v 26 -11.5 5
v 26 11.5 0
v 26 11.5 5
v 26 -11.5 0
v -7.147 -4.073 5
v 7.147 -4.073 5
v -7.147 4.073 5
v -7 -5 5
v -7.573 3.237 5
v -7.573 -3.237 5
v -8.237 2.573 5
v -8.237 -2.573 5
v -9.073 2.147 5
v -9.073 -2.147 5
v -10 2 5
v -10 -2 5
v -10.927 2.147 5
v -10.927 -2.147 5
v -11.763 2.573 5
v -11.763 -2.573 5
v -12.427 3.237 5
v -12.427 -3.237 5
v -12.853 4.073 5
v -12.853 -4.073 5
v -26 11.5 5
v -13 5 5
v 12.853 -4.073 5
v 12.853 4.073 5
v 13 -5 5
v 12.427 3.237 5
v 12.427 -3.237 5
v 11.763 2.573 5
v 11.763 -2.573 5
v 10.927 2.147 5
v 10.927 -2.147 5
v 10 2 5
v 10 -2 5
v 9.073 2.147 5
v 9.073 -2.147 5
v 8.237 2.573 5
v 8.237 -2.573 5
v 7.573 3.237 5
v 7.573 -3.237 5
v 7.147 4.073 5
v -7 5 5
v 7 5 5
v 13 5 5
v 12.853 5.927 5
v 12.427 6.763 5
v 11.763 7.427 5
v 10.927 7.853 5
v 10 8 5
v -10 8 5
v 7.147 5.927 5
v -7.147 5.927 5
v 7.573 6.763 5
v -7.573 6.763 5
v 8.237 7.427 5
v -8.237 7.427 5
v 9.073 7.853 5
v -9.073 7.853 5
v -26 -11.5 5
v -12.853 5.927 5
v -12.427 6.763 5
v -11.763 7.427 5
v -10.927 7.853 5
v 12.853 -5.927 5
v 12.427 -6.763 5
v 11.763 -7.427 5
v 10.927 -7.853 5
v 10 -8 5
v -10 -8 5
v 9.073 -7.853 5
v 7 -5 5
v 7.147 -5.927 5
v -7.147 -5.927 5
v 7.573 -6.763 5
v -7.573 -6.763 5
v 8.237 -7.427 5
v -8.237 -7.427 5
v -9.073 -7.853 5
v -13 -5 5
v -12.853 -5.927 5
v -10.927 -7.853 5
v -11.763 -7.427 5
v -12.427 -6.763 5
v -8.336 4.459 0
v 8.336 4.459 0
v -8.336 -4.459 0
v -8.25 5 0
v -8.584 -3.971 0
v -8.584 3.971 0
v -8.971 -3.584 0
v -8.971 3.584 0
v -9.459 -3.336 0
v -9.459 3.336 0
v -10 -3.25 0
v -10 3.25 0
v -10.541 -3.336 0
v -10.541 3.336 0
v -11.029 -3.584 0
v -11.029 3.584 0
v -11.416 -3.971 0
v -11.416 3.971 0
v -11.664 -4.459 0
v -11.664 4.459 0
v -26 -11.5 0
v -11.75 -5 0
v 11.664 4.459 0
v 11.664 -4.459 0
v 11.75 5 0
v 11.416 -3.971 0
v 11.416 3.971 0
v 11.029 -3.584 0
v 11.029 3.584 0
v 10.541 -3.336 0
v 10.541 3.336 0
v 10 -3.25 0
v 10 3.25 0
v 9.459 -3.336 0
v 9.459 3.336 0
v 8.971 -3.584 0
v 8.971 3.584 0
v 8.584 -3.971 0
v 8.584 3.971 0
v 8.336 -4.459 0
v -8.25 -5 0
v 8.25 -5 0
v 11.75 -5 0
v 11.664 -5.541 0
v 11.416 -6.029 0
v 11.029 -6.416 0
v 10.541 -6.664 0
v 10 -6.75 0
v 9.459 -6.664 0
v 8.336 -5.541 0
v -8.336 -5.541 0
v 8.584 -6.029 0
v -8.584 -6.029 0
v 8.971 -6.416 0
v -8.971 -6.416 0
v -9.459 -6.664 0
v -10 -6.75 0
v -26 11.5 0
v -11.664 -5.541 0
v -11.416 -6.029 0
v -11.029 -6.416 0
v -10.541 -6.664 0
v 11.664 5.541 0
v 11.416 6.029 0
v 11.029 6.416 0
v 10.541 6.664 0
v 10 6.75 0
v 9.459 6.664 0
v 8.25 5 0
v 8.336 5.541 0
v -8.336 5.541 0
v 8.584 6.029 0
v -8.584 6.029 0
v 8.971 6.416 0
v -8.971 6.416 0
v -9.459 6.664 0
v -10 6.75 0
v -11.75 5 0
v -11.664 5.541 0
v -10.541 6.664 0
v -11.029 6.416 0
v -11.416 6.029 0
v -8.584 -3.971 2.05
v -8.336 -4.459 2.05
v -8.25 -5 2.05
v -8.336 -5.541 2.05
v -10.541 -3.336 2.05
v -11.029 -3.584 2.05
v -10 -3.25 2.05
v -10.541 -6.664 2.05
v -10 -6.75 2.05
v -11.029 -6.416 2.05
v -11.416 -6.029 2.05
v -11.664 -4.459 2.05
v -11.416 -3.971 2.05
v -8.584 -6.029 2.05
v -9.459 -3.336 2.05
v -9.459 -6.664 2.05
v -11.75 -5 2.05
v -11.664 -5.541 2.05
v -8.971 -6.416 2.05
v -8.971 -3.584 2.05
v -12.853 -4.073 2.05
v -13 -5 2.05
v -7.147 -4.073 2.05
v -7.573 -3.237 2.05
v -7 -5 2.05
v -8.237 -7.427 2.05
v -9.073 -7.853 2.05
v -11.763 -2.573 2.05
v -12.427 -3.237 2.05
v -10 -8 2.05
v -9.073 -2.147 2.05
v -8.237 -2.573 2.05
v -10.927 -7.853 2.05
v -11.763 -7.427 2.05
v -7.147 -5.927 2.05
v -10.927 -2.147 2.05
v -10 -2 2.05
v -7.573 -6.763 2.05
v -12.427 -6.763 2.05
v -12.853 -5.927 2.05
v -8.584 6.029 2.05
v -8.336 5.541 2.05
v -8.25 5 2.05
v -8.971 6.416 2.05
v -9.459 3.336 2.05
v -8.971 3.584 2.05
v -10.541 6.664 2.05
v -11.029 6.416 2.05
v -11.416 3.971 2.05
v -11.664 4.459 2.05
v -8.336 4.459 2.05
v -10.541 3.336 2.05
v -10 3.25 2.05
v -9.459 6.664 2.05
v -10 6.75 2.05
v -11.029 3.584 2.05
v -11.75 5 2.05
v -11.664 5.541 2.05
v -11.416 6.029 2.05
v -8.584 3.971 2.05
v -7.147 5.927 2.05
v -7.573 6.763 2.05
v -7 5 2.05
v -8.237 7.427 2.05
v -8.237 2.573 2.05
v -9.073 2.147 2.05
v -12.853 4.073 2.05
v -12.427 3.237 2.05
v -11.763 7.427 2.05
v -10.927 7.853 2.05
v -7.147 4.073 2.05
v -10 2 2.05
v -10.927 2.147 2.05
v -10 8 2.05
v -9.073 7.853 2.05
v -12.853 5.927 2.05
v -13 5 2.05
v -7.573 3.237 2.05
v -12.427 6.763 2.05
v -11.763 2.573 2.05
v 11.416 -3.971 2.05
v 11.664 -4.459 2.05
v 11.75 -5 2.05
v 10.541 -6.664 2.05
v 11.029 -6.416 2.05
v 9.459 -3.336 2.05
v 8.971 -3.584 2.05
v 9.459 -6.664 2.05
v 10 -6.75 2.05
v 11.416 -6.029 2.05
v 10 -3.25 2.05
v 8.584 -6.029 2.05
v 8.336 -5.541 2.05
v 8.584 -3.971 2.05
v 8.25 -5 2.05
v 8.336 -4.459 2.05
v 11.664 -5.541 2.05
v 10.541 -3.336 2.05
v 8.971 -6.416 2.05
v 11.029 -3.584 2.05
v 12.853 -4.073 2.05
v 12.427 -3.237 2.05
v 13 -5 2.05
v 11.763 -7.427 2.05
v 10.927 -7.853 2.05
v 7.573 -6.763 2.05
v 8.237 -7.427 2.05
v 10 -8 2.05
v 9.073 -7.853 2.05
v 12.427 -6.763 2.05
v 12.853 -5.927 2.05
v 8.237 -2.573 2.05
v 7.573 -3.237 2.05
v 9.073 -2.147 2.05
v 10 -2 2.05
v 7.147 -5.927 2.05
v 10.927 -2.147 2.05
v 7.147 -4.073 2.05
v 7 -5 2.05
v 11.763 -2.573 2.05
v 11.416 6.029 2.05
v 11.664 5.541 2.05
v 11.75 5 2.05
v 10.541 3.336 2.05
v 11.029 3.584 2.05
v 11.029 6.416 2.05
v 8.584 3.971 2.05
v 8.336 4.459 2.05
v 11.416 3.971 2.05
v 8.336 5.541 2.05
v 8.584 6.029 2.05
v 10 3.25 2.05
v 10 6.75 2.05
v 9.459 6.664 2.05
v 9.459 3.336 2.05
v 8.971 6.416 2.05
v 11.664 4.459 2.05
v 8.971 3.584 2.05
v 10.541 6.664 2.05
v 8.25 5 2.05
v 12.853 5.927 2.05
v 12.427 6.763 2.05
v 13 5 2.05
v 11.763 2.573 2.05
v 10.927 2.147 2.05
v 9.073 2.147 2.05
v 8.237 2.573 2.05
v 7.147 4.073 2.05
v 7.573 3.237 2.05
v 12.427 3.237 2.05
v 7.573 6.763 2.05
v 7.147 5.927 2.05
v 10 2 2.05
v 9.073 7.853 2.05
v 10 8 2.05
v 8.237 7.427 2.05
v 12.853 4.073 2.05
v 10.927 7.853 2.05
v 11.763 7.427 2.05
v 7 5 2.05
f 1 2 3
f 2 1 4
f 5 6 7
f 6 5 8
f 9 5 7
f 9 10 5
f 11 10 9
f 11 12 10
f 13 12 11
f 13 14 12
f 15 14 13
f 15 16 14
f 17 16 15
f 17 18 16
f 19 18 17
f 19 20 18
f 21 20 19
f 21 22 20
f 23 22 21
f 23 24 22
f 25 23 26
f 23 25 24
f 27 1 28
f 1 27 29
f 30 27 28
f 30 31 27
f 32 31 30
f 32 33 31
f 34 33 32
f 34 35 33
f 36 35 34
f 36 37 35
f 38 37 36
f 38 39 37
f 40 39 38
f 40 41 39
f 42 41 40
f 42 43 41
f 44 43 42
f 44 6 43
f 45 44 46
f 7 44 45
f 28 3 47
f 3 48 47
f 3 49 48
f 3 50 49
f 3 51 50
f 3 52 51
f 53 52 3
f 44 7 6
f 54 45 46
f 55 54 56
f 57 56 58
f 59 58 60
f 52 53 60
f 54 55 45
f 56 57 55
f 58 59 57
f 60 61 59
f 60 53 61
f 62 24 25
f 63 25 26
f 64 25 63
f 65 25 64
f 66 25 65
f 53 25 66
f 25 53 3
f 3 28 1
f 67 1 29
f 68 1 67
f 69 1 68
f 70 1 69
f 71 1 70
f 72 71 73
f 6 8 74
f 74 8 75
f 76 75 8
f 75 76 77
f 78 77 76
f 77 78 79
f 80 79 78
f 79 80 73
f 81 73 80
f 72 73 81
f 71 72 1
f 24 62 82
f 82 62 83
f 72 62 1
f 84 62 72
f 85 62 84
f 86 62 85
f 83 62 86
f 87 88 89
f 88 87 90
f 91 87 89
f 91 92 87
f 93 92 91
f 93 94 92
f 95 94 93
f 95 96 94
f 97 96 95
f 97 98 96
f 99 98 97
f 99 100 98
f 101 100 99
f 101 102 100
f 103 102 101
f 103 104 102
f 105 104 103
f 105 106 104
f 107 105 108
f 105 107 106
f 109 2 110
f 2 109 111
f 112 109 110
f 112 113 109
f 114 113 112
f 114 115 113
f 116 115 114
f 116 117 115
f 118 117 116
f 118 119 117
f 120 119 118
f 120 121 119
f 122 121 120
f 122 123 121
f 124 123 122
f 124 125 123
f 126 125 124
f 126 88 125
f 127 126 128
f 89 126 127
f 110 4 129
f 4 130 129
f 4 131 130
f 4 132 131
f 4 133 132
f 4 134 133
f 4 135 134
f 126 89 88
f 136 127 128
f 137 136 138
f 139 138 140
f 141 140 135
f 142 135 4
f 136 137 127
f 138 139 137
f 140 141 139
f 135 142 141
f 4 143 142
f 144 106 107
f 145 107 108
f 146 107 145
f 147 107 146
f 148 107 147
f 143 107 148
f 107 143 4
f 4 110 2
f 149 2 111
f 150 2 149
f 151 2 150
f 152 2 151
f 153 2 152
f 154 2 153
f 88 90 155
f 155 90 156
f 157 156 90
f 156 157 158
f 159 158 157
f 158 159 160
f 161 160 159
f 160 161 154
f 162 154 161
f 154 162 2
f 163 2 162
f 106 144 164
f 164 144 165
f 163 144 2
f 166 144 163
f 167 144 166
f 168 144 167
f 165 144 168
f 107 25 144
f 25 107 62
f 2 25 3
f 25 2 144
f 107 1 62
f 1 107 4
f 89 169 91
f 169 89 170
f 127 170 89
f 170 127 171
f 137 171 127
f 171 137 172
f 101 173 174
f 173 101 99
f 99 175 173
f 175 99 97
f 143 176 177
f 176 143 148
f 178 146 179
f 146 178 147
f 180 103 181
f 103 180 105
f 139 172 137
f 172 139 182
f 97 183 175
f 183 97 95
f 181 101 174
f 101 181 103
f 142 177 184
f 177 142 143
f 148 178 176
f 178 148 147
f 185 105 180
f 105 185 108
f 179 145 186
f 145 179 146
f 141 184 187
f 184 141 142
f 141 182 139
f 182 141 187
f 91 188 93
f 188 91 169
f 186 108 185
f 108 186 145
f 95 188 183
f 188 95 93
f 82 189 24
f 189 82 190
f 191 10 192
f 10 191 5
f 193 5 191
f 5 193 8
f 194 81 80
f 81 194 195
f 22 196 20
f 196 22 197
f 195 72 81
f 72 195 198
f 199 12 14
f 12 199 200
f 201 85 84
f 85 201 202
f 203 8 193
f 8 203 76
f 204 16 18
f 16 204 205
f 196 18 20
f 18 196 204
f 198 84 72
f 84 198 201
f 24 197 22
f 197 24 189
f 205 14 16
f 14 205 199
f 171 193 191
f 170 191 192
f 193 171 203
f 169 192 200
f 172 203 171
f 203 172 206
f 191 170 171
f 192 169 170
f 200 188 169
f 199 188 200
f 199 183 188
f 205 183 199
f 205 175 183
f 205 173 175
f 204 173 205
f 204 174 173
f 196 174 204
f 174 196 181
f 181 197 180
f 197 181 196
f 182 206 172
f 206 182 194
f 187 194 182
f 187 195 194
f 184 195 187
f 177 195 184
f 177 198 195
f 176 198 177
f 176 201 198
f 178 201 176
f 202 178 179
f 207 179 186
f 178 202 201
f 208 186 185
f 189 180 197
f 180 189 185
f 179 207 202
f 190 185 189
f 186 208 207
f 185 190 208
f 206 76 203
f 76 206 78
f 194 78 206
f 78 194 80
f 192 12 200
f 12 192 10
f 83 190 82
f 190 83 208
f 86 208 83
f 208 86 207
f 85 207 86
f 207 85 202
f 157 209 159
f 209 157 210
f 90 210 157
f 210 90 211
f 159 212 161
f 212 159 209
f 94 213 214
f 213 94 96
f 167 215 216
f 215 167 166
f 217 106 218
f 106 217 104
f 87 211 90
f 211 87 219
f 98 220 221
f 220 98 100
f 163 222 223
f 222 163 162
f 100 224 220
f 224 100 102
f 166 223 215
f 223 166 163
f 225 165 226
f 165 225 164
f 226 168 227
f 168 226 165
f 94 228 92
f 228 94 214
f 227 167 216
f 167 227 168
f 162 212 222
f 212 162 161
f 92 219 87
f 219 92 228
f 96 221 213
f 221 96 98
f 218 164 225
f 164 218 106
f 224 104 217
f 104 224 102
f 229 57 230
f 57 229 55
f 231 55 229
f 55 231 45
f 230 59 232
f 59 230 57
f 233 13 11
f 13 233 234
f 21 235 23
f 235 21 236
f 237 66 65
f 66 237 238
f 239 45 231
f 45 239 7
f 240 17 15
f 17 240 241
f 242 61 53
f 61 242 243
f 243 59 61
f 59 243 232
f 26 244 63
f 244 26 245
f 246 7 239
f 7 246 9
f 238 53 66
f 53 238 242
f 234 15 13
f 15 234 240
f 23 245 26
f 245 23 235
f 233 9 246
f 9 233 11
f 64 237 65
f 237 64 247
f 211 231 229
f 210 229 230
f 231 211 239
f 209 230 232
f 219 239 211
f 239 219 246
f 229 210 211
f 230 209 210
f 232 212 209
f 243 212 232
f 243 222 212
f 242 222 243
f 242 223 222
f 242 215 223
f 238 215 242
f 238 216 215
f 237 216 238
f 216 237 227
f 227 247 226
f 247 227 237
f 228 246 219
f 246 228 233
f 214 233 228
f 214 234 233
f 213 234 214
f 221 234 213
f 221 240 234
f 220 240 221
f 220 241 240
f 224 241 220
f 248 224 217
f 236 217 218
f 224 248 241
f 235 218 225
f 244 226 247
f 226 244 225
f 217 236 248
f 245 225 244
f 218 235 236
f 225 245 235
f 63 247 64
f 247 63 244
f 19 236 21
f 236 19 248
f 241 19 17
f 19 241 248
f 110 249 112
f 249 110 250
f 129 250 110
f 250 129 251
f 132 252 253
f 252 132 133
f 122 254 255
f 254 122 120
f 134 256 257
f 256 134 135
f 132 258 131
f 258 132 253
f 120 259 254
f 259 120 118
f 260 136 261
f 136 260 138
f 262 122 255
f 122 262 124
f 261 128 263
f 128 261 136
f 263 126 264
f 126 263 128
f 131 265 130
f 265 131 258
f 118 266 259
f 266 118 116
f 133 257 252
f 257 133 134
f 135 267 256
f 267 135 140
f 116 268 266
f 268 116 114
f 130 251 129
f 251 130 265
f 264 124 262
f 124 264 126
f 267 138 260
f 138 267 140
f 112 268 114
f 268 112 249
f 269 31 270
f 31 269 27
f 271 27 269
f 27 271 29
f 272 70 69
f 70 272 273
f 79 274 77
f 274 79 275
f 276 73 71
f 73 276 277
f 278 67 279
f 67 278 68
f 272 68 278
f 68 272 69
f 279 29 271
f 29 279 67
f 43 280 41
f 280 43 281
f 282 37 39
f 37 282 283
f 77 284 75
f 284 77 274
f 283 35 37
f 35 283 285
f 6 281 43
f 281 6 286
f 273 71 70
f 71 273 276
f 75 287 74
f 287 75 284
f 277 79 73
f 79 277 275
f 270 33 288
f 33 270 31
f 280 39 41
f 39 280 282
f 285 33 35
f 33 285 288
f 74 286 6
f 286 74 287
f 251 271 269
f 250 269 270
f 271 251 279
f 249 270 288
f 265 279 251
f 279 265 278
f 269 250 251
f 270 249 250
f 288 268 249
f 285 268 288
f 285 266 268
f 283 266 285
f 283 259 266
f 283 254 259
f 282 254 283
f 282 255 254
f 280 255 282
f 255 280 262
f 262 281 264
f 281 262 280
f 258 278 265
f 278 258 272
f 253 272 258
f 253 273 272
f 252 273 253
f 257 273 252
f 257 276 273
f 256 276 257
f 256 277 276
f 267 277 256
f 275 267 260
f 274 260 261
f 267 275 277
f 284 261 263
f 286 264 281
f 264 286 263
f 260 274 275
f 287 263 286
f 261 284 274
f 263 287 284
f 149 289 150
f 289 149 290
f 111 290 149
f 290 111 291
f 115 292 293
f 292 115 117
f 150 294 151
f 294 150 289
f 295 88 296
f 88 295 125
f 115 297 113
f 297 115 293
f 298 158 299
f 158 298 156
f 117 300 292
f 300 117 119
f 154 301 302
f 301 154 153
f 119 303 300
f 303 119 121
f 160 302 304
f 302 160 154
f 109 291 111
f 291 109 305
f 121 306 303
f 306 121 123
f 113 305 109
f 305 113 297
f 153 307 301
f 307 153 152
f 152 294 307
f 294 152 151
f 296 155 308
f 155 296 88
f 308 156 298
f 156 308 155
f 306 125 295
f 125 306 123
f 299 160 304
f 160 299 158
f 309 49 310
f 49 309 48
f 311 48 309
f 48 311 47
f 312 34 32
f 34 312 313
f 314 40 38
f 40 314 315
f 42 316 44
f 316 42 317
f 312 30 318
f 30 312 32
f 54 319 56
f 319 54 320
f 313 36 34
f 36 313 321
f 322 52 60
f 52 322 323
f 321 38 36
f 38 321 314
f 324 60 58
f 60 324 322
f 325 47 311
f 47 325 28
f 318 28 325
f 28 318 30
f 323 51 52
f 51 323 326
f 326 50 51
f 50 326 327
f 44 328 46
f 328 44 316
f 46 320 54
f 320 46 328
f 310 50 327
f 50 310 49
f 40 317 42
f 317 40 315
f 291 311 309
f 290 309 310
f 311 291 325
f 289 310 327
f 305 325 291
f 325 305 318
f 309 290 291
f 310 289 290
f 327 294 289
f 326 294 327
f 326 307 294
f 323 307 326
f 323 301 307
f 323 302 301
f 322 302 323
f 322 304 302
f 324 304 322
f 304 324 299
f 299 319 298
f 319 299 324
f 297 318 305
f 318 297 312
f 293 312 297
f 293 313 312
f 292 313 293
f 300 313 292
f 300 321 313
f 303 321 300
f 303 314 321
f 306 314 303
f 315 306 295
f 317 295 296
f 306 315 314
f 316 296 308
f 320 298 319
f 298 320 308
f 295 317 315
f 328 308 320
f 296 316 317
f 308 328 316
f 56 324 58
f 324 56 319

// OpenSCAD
difference() {
	translate(v = [0, 0, 2.5000000000]) {
		cube(center = true, size = [52.0000000000, 23.0000000000, 5]);
	}
	translate(v = [-10, -5, 0]) {
		cylinder($fn = 20, d = 3.5000000000, h = 10);
	}
	translate(v = [-10, -5, 2.0500000000]) {
		cylinder($fn = 20, d = 6.0000000000, h = 3);
	}
	translate(v = [-10, 5, 0]) {
		cylinder($fn = 20, d = 3.5000000000, h = 10);
	}
	translate(v = [-10, 5, 2.0500000000]) {
		cylinder($fn = 20, d = 6.0000000000, h = 3);
	}
	translate(v = [10, -5, 0]) {
		cylinder($fn = 20, d = 3.5000000000, h = 10);
	}
	translate(v = [10, -5, 2.0500000000]) {
		cylinder($fn = 20, d = 6.0000000000, h = 3);
	}
	translate(v = [10, 5, 0]) {
		cylinder($fn = 20, d = 3.5000000000, h = 10);
	}
	translate(v = [10, 5, 2.0500000000]) {
		cylinder($fn = 20, d = 6.0000000000, h = 3);
	}
}
/***********************************************
*********      SolidPython code:      **********
************************************************
 
import os
cq = 20

render = False
os.environ["PRINTEDSCOPE_QUALITY"] = str(cq)

from lib.global_parameters import *
from lib.model_parameters import *
from solid import *
from solid.utils import *
import numpy as np


g1p1_bearing = bearing_625
g1g1_space = 3 # jak velka bude mezera mezi zakladnou na zemi a AZ sestavou
g1p1_pipe_center_distance = 20 # jak daleko konci trubka od stredu
g1_pipe_in = 40
g1p1_diameter = 60
g1_foot_height = 60
g1_pipe_bolt = get_optimal_bolt(3, base_pipe['D']+5)



g1_foot_length = 100
g1_foot_width = 50
g1_pipe_distance = 40
g1_pipe = pipe_20_2
g1_pipe['min_wall'] = 5
g1p4_wall = 2

g1_foot_bridge_height = 10
g1_foot_bridge_length =  g1_foot_length-50

#g1_foot_length = g1_pipe_distance+g1_pipe['D']+2*g1_pipe['min_wall']

# kostka, na ktere to lezi na zemi...
g1p2_width = 50
g1p2_length = 100
g1p2_height = g1_foot_height

def s111g1p01():
	pipe_bolt = g1_pipe_bolt
	pipe_height = pipe_bolt['l']
	pipe_height += pipe_bolt['k']
	bottom = -(pipe_height-g1_pipe['min_wall']-g1_pipe['D']/2)-clear

	m= cylinder(h=pipe_height, d=100)
	for x in range(3):
		m+= rotate([0, 0, 360/3*x])(
			translate([0, -(g1_pipe['D']+g1_pipe_distance+2*g1_pipe['min_wall'])/2,0])(
				cube([g1p1_diameter, g1_pipe['D']+g1_pipe_distance+2*g1_pipe['min_wall'], pipe_height])
			)
		)
	m = down(pipe_height-g1_pipe['min_wall']-g1_pipe['D']/2)(m)
	#m = hull()(m)

	m+= up(pipe_height/2-1.1)(
			difference()(
				cylinder(h=5, d=80, segments=cq),
				down(clear/2)(cylinder(h=10+clear, d=80-3, segments=cq))
			)
		)
	
	m-=(up(pipe_height/2-g1_pipe['min_wall']+1)(cylinder(h=5+clear, d1=80-3-5, d2=80-3, segments=cq)))


	for x in range(3):
		m-= rotate([0, 90, 360/3*x])(
			# diry pro zastrceni trubky
			translate([0, -g1_pipe_distance/2, g1p1_pipe_center_distance])(
				cylinder(d= base_pipe['D'], h=100, segments=cq)
			),
			translate([0, g1_pipe_distance/2, g1p1_pipe_center_distance])(
				cylinder(d= base_pipe['D'], h=100, segments=cq)
			),
			# diry pro pridelani trubek
			translate([2, -g1_pipe_distance/2, g1p1_diameter*0.75])(
				rotate([0, -90, 0])(
					bolt_hole(pipe_bolt, nut=-3, align='center')
				)
			),
			translate([2, g1_pipe_distance/2, g1p1_diameter*0.75])(
				rotate([0, -90, 0])(
					(bolt_hole(pipe_bolt, nut=-3, align='center'))
				)
			),

			# otvor pro srouby pro pridelani lozisek
			translate([0, 0, (g1p1_bearing['D'])])(
				left(bottom+pipe_height-2-M3['k']-g1p1_bearing['B'])(
					rotate([0, 180, 90])(
						nut_pocket(pipe_bolt, g1p1_bearing['D'])
					)
				),
				left(bottom-1+M3['m']+g1p1_bearing['B'])(
					rotate([0, 180, 90])(
						nut_pocket(pipe_bolt, g1p1_bearing['D'])
					)
				),
				left(bottom+50)(rotate([0, 90, 0])(
					cylinder(d=M3['d'], h=100, segments=cq)
				))
			)
		)

	# dira pro vyvedeni kabelu
	m -= translate([20, base_pipe['D'], bottom+pipe_height/2+clear])(
			cylinder(d=10, h=pipe_height/2+clear)
		)
	m -= translate([20, -base_pipe['D'], bottom+pipe_height/2+clear])(
			cylinder(d=10, h=pipe_height/2+clear)
		)

	# diry skrz pro loziska a sroub M5 a osazeni pro pridelani loziska
	m -= up(bottom)(
			cylinder(d=g1p1_bearing['D']+4*M3['dk']+1, h=M3['k']+2)
		)
	m -= up(bottom+M3['k']+2+layer*1)(
			cylinder(d=g1p1_bearing['D'], h=g1p1_bearing['B'])
		)
	m -= up(bottom+M3['k']+2+layer*2+g1p1_bearing['B'])(
			cylinder(d=g1p1_bearing['D']-4, h=50)
		)
	m -= up(bottom+pipe_height-M3['k']-2- g1p1_bearing['B'])(
			cylinder(d=g1p1_bearing['D'], h=g1p1_bearing['B'])
		)
	m -= up(bottom+pipe_height-M3['k']-2-clear)(
			cylinder(d=g1p1_bearing['D']+4*M3['dk']+1, h=50)
		)

	return m

def s111g1p02():
	m = cylinder(d=g1p1_bearing['D']+4*M3['dk'], h=M3['k']+2)
	m-= down(clear/2)(cylinder(d=g1p1_bearing['bolt']['dk']+1, h=M3['k']+2+clear))
	for x in range(3):
		m-=rotate([180, 0, 360/3*x])(
			translate([-g1p1_bearing['D'], 0, -M3['k']])(
				bolt_hole(M3, l=30)
			)
		)

	return m

def s111g1p03():
	m = cylinder(d=g1p1_bearing['D']+4*M3['dk'], h=M3['k']+2)
	m-= down(clear/2)(cylinder(h=3, d=25))
	m-= down(clear/2)(cylinder(d=g1p1_bearing['D']-3, h=M3['k']+2+clear))
	for x in range(3):
		m-=rotate([180, 0, 360/3*x])(
			translate([-g1p1_bearing['D'], 0, -M3['k']])(
				bolt_hole(M3, l=30)
			)
		)

	return m

def s111g1p04():

	## zakladni tvar nohy
	m = left(g1_pipe_distance/2)(
			cylinder(h=g1_foot_width, d=g1_pipe['D']+g1_pipe['min_wall']*2, segments=cq)
		)
	m += right(g1_pipe_distance/2)(
			cylinder(h=g1_foot_width, d=g1_pipe['D']+g1_pipe['min_wall']*2, segments=cq)
		)
	m += translate([-g1_foot_length/2, -g1_foot_height, 0])(
			cube([g1_foot_length, 5, g1_foot_width])
		)
	m = hull()(m)


	## odebrani premosteni
	r = left(g1_foot_bridge_length/2)(
			cylinder(h=g1_foot_width+clear, d=g1_pipe['D'], segments=cq)
		)
	r += right(g1_foot_bridge_length/2)(
			cylinder(h=g1_foot_width+clear, d=g1_pipe['D'], segments=cq)
		)
	r += translate([-(g1_foot_bridge_length+g1_pipe['D'])/2, -g1_foot_bridge_height, 0])(
			cube([(g1_foot_bridge_length+g1_pipe['D']), 5, g1_foot_width+clear])
		)
	r = hull()(translate([0, -g1_foot_height+g1_foot_bridge_height-clear, -clear/2])(r))
	m-=r


	## odebrani diry pro elektroniku
	r = translate([-g1_pipe_distance/2, -g1p2_height, g1p4_wall])(
			cube([g1_pipe_distance, g1p2_height, g1_foot_width-2*g1p4_wall])
		)
	r += translate([-g1_pipe_distance/2-M3['dk']*1, -g1p2_height, g1p4_wall])(
			cube([g1_pipe_distance+M3['dk']*2, g1_foot_bridge_height+base_pipe['D']/2+5, g1_foot_width-2*g1p4_wall])
		)
	
	r -= left(g1_pipe_distance/2)(
			cylinder(h=g1_foot_width, d=g1_pipe['D']+2.5*g1_pipe['min_wall'])
		)
	r -= right(g1_pipe_distance/2)(
			cylinder(h=g1_foot_width, d=g1_pipe['D']+2.5*g1_pipe['min_wall'])
		)
	#r -= up(20)(
	#		cylinder(h=g1_foot_width-20, d=g1p1_bearing['D']+1)
	#	)
	m-=(r)

	## diry na trubky a srouby skrz trubky
	m -= translate([-g1_pipe_distance/2, 0, 2])(
			cylinder(h=g1_foot_width, d=g1_pipe['D'], segments=cq)
		)
	m -= translate([g1_pipe_distance/2, 0,2])(
			cylinder(h=g1_foot_width, d=g1_pipe['D'], segments=cq)
		)
	m -= translate([g1_pipe_distance/2, g1_pipe['D']/2+g1_pipe['min_wall'], 2+g1p1_diameter*0.75-g1p1_pipe_center_distance])(
			bolt_hole(M3, align='head', rotation=np.array([-1,0,0]), nut=-4)
			)
	m -=translate([-g1_pipe_distance/2, g1_pipe['D']/2+g1_pipe['min_wall'], 2+g1p1_diameter*0.75-g1p1_pipe_center_distance])(
			bolt_hole(M3, align='head', rotation=np.array([-1,0,0]), nut=-4)
		)

	m-= translate([0, g1_pipe['D']/2+g1_pipe['min_wall']-g1p1_bearing['D']/2, g1_foot_width/2+2-g1p1_bearing['B']/2])(
			hull()(
				cylinder(d=g1p1_bearing['D']+2, h=g1p1_bearing['B']+2),
				forward(g1p1_bearing['D'])(cylinder(d=g1p1_bearing['D']+2, h=g1p1_bearing['B']+2))
			),
			bolt_hole(M5, l=20, overlap =8, head_overlap=50, align='center', nut = -0.1, nut_type='nut_pocket', nut_rotation=180)
		)

	return forward(g1_foot_width/2+2)(rotate([90, 0, 0])(m))

def s111g1p05():
	m = s111g1p04()
	return m

def s111g1p06():

	## zakladni tvar nohy
	m = left(g1_pipe_distance/2)(
			cylinder(h=g1_foot_width, d=g1_pipe['D']+g1_pipe['min_wall']*2, segments=cq)
		)
	m += right(g1_pipe_distance/2)(
			cylinder(h=g1_foot_width, d=g1_pipe['D']+g1_pipe['min_wall']*2, segments=cq)
		)
	m = hull()(m)

	## diry na trubky a srouby skrz trubky
	m -= translate([-g1_pipe_distance/2, 0, -clear])(
			cylinder(h=g1_foot_width+2*clear, d=g1_pipe['D'], segments=cq)
		)
	m -= translate([g1_pipe_distance/2, 0, -clear])(
			cylinder(h=g1_foot_width+2*clear, d=g1_pipe['D'], segments=cq)
		)
	m -= translate([g1_pipe_distance/2, g1_pipe['D']/2+g1_pipe['min_wall'], 2+g1p1_diameter*0.75-g1p1_pipe_center_distance])(
			bolt_hole(M3, align='head', rotation=np.array([-1,0,0]), nut=-4)
			)
	m -=translate([-g1_pipe_distance/2, g1_pipe['D']/2+g1_pipe['min_wall'], 2+g1p1_diameter*0.75-g1p1_pipe_center_distance])(
			bolt_hole(M3, align='head', rotation=np.array([-1,0,0]), nut=-4)
		)

	m-= translate([0, g1_pipe['D']/2+g1_pipe['min_wall']-g1p1_bearing['D']/2, g1_foot_width/2+2-g1p1_bearing['B']/2])(
			hull()(
				cylinder(d=g1p1_bearing['D']+2, h=g1p1_bearing['B']+2),
				forward(g1p1_bearing['D'])(cylinder(d=g1p1_bearing['D']+2, h=g1p1_bearing['B']+2))
			),
			bolt_hole(M5, l=20, overlap =8, head_overlap=50, align='center', nut = -0.1, nut_type='nut_pocket', nut_rotation=180)
		)

	return forward(g1_foot_width/2+2)(rotate([90, 0, 0])(m))


def s111g1p07():
	m = up(5/2)(cube([g1_pipe_distance+M3['dk']*2, g1_foot_bridge_height+base_pipe['D']/2+5, 5], center=True))
	for x in [-10, 10]:
		for y in [-5, 5]:
			m-=translate([x,y,0])(cylinder(d=M3['d'], h=10, segments=cq))
			m-=translate([x,y,2+clear])(cylinder(d=M3['dk'], h=3, segments=cq))
	return m




def s111g1d01():
	m = translate([-g1_pipe['D'], -g1_pipe['D'], -2])(cube([g1_pipe['D']*2, g1_pipe['D']*2, 35]))
	m-= cylinder(h=g1p1_diameter, d=g1_pipe['D'])
	m-= translate([0,0,g1p1_diameter*0.75-g1p1_pipe_center_distance])(rotate([0,90,0])(bolt_hole(M3, l=g1_pipe['D']+4, nut=g1_pipe['D']+4, align='center')))

	return m

def s111g1_info():
	print("\nInformace o dilech 111_10**.scad")
	print("===============================")
	print("Statická základna dalekohledu")
	print("Skrz trubky je sroub", g1_pipe_bolt)
	print("Stredy trubek jsou vzdaleny", g1_pipe_distance)
	print("AL tyce o D: {} mm, delka: {} mm, {}ks".format(base_pipe['D'], g2_octangle_do/2+g1p2_width/2-2-g1p1_pipe_center_distance, 6))


scad_render_to_file(s111g1p01(), '../scad/111_1001.scad')
scad_render_to_file(s111g1p02(), '../scad/111_1002.scad')
scad_render_to_file(s111g1p03(), '../scad/111_1003.scad')
scad_render_to_file(s111g1p04(), '../scad/111_1004.scad')
scad_render_to_file(s111g1p05(), '../scad/111_1005.scad')
scad_render_to_file(s111g1p06(), '../scad/111_1006.scad')
scad_render_to_file(s111g1p07(), '../scad/111_1007.scad')

render = False
if render:
	cq = 100
	generate(s111g1p01(), '111_1001')
	generate(s111g1p02(), '111_1002')
	generate(s111g1p03(), '111_1003')
	generate(s111g1p04(), '111_1004')
	generate(s111g1p05(), '111_1005')
	generate(s111g1p06(), '111_1006')
	generate(s111g1p07(), '111_1007') 
 
************************************************/
